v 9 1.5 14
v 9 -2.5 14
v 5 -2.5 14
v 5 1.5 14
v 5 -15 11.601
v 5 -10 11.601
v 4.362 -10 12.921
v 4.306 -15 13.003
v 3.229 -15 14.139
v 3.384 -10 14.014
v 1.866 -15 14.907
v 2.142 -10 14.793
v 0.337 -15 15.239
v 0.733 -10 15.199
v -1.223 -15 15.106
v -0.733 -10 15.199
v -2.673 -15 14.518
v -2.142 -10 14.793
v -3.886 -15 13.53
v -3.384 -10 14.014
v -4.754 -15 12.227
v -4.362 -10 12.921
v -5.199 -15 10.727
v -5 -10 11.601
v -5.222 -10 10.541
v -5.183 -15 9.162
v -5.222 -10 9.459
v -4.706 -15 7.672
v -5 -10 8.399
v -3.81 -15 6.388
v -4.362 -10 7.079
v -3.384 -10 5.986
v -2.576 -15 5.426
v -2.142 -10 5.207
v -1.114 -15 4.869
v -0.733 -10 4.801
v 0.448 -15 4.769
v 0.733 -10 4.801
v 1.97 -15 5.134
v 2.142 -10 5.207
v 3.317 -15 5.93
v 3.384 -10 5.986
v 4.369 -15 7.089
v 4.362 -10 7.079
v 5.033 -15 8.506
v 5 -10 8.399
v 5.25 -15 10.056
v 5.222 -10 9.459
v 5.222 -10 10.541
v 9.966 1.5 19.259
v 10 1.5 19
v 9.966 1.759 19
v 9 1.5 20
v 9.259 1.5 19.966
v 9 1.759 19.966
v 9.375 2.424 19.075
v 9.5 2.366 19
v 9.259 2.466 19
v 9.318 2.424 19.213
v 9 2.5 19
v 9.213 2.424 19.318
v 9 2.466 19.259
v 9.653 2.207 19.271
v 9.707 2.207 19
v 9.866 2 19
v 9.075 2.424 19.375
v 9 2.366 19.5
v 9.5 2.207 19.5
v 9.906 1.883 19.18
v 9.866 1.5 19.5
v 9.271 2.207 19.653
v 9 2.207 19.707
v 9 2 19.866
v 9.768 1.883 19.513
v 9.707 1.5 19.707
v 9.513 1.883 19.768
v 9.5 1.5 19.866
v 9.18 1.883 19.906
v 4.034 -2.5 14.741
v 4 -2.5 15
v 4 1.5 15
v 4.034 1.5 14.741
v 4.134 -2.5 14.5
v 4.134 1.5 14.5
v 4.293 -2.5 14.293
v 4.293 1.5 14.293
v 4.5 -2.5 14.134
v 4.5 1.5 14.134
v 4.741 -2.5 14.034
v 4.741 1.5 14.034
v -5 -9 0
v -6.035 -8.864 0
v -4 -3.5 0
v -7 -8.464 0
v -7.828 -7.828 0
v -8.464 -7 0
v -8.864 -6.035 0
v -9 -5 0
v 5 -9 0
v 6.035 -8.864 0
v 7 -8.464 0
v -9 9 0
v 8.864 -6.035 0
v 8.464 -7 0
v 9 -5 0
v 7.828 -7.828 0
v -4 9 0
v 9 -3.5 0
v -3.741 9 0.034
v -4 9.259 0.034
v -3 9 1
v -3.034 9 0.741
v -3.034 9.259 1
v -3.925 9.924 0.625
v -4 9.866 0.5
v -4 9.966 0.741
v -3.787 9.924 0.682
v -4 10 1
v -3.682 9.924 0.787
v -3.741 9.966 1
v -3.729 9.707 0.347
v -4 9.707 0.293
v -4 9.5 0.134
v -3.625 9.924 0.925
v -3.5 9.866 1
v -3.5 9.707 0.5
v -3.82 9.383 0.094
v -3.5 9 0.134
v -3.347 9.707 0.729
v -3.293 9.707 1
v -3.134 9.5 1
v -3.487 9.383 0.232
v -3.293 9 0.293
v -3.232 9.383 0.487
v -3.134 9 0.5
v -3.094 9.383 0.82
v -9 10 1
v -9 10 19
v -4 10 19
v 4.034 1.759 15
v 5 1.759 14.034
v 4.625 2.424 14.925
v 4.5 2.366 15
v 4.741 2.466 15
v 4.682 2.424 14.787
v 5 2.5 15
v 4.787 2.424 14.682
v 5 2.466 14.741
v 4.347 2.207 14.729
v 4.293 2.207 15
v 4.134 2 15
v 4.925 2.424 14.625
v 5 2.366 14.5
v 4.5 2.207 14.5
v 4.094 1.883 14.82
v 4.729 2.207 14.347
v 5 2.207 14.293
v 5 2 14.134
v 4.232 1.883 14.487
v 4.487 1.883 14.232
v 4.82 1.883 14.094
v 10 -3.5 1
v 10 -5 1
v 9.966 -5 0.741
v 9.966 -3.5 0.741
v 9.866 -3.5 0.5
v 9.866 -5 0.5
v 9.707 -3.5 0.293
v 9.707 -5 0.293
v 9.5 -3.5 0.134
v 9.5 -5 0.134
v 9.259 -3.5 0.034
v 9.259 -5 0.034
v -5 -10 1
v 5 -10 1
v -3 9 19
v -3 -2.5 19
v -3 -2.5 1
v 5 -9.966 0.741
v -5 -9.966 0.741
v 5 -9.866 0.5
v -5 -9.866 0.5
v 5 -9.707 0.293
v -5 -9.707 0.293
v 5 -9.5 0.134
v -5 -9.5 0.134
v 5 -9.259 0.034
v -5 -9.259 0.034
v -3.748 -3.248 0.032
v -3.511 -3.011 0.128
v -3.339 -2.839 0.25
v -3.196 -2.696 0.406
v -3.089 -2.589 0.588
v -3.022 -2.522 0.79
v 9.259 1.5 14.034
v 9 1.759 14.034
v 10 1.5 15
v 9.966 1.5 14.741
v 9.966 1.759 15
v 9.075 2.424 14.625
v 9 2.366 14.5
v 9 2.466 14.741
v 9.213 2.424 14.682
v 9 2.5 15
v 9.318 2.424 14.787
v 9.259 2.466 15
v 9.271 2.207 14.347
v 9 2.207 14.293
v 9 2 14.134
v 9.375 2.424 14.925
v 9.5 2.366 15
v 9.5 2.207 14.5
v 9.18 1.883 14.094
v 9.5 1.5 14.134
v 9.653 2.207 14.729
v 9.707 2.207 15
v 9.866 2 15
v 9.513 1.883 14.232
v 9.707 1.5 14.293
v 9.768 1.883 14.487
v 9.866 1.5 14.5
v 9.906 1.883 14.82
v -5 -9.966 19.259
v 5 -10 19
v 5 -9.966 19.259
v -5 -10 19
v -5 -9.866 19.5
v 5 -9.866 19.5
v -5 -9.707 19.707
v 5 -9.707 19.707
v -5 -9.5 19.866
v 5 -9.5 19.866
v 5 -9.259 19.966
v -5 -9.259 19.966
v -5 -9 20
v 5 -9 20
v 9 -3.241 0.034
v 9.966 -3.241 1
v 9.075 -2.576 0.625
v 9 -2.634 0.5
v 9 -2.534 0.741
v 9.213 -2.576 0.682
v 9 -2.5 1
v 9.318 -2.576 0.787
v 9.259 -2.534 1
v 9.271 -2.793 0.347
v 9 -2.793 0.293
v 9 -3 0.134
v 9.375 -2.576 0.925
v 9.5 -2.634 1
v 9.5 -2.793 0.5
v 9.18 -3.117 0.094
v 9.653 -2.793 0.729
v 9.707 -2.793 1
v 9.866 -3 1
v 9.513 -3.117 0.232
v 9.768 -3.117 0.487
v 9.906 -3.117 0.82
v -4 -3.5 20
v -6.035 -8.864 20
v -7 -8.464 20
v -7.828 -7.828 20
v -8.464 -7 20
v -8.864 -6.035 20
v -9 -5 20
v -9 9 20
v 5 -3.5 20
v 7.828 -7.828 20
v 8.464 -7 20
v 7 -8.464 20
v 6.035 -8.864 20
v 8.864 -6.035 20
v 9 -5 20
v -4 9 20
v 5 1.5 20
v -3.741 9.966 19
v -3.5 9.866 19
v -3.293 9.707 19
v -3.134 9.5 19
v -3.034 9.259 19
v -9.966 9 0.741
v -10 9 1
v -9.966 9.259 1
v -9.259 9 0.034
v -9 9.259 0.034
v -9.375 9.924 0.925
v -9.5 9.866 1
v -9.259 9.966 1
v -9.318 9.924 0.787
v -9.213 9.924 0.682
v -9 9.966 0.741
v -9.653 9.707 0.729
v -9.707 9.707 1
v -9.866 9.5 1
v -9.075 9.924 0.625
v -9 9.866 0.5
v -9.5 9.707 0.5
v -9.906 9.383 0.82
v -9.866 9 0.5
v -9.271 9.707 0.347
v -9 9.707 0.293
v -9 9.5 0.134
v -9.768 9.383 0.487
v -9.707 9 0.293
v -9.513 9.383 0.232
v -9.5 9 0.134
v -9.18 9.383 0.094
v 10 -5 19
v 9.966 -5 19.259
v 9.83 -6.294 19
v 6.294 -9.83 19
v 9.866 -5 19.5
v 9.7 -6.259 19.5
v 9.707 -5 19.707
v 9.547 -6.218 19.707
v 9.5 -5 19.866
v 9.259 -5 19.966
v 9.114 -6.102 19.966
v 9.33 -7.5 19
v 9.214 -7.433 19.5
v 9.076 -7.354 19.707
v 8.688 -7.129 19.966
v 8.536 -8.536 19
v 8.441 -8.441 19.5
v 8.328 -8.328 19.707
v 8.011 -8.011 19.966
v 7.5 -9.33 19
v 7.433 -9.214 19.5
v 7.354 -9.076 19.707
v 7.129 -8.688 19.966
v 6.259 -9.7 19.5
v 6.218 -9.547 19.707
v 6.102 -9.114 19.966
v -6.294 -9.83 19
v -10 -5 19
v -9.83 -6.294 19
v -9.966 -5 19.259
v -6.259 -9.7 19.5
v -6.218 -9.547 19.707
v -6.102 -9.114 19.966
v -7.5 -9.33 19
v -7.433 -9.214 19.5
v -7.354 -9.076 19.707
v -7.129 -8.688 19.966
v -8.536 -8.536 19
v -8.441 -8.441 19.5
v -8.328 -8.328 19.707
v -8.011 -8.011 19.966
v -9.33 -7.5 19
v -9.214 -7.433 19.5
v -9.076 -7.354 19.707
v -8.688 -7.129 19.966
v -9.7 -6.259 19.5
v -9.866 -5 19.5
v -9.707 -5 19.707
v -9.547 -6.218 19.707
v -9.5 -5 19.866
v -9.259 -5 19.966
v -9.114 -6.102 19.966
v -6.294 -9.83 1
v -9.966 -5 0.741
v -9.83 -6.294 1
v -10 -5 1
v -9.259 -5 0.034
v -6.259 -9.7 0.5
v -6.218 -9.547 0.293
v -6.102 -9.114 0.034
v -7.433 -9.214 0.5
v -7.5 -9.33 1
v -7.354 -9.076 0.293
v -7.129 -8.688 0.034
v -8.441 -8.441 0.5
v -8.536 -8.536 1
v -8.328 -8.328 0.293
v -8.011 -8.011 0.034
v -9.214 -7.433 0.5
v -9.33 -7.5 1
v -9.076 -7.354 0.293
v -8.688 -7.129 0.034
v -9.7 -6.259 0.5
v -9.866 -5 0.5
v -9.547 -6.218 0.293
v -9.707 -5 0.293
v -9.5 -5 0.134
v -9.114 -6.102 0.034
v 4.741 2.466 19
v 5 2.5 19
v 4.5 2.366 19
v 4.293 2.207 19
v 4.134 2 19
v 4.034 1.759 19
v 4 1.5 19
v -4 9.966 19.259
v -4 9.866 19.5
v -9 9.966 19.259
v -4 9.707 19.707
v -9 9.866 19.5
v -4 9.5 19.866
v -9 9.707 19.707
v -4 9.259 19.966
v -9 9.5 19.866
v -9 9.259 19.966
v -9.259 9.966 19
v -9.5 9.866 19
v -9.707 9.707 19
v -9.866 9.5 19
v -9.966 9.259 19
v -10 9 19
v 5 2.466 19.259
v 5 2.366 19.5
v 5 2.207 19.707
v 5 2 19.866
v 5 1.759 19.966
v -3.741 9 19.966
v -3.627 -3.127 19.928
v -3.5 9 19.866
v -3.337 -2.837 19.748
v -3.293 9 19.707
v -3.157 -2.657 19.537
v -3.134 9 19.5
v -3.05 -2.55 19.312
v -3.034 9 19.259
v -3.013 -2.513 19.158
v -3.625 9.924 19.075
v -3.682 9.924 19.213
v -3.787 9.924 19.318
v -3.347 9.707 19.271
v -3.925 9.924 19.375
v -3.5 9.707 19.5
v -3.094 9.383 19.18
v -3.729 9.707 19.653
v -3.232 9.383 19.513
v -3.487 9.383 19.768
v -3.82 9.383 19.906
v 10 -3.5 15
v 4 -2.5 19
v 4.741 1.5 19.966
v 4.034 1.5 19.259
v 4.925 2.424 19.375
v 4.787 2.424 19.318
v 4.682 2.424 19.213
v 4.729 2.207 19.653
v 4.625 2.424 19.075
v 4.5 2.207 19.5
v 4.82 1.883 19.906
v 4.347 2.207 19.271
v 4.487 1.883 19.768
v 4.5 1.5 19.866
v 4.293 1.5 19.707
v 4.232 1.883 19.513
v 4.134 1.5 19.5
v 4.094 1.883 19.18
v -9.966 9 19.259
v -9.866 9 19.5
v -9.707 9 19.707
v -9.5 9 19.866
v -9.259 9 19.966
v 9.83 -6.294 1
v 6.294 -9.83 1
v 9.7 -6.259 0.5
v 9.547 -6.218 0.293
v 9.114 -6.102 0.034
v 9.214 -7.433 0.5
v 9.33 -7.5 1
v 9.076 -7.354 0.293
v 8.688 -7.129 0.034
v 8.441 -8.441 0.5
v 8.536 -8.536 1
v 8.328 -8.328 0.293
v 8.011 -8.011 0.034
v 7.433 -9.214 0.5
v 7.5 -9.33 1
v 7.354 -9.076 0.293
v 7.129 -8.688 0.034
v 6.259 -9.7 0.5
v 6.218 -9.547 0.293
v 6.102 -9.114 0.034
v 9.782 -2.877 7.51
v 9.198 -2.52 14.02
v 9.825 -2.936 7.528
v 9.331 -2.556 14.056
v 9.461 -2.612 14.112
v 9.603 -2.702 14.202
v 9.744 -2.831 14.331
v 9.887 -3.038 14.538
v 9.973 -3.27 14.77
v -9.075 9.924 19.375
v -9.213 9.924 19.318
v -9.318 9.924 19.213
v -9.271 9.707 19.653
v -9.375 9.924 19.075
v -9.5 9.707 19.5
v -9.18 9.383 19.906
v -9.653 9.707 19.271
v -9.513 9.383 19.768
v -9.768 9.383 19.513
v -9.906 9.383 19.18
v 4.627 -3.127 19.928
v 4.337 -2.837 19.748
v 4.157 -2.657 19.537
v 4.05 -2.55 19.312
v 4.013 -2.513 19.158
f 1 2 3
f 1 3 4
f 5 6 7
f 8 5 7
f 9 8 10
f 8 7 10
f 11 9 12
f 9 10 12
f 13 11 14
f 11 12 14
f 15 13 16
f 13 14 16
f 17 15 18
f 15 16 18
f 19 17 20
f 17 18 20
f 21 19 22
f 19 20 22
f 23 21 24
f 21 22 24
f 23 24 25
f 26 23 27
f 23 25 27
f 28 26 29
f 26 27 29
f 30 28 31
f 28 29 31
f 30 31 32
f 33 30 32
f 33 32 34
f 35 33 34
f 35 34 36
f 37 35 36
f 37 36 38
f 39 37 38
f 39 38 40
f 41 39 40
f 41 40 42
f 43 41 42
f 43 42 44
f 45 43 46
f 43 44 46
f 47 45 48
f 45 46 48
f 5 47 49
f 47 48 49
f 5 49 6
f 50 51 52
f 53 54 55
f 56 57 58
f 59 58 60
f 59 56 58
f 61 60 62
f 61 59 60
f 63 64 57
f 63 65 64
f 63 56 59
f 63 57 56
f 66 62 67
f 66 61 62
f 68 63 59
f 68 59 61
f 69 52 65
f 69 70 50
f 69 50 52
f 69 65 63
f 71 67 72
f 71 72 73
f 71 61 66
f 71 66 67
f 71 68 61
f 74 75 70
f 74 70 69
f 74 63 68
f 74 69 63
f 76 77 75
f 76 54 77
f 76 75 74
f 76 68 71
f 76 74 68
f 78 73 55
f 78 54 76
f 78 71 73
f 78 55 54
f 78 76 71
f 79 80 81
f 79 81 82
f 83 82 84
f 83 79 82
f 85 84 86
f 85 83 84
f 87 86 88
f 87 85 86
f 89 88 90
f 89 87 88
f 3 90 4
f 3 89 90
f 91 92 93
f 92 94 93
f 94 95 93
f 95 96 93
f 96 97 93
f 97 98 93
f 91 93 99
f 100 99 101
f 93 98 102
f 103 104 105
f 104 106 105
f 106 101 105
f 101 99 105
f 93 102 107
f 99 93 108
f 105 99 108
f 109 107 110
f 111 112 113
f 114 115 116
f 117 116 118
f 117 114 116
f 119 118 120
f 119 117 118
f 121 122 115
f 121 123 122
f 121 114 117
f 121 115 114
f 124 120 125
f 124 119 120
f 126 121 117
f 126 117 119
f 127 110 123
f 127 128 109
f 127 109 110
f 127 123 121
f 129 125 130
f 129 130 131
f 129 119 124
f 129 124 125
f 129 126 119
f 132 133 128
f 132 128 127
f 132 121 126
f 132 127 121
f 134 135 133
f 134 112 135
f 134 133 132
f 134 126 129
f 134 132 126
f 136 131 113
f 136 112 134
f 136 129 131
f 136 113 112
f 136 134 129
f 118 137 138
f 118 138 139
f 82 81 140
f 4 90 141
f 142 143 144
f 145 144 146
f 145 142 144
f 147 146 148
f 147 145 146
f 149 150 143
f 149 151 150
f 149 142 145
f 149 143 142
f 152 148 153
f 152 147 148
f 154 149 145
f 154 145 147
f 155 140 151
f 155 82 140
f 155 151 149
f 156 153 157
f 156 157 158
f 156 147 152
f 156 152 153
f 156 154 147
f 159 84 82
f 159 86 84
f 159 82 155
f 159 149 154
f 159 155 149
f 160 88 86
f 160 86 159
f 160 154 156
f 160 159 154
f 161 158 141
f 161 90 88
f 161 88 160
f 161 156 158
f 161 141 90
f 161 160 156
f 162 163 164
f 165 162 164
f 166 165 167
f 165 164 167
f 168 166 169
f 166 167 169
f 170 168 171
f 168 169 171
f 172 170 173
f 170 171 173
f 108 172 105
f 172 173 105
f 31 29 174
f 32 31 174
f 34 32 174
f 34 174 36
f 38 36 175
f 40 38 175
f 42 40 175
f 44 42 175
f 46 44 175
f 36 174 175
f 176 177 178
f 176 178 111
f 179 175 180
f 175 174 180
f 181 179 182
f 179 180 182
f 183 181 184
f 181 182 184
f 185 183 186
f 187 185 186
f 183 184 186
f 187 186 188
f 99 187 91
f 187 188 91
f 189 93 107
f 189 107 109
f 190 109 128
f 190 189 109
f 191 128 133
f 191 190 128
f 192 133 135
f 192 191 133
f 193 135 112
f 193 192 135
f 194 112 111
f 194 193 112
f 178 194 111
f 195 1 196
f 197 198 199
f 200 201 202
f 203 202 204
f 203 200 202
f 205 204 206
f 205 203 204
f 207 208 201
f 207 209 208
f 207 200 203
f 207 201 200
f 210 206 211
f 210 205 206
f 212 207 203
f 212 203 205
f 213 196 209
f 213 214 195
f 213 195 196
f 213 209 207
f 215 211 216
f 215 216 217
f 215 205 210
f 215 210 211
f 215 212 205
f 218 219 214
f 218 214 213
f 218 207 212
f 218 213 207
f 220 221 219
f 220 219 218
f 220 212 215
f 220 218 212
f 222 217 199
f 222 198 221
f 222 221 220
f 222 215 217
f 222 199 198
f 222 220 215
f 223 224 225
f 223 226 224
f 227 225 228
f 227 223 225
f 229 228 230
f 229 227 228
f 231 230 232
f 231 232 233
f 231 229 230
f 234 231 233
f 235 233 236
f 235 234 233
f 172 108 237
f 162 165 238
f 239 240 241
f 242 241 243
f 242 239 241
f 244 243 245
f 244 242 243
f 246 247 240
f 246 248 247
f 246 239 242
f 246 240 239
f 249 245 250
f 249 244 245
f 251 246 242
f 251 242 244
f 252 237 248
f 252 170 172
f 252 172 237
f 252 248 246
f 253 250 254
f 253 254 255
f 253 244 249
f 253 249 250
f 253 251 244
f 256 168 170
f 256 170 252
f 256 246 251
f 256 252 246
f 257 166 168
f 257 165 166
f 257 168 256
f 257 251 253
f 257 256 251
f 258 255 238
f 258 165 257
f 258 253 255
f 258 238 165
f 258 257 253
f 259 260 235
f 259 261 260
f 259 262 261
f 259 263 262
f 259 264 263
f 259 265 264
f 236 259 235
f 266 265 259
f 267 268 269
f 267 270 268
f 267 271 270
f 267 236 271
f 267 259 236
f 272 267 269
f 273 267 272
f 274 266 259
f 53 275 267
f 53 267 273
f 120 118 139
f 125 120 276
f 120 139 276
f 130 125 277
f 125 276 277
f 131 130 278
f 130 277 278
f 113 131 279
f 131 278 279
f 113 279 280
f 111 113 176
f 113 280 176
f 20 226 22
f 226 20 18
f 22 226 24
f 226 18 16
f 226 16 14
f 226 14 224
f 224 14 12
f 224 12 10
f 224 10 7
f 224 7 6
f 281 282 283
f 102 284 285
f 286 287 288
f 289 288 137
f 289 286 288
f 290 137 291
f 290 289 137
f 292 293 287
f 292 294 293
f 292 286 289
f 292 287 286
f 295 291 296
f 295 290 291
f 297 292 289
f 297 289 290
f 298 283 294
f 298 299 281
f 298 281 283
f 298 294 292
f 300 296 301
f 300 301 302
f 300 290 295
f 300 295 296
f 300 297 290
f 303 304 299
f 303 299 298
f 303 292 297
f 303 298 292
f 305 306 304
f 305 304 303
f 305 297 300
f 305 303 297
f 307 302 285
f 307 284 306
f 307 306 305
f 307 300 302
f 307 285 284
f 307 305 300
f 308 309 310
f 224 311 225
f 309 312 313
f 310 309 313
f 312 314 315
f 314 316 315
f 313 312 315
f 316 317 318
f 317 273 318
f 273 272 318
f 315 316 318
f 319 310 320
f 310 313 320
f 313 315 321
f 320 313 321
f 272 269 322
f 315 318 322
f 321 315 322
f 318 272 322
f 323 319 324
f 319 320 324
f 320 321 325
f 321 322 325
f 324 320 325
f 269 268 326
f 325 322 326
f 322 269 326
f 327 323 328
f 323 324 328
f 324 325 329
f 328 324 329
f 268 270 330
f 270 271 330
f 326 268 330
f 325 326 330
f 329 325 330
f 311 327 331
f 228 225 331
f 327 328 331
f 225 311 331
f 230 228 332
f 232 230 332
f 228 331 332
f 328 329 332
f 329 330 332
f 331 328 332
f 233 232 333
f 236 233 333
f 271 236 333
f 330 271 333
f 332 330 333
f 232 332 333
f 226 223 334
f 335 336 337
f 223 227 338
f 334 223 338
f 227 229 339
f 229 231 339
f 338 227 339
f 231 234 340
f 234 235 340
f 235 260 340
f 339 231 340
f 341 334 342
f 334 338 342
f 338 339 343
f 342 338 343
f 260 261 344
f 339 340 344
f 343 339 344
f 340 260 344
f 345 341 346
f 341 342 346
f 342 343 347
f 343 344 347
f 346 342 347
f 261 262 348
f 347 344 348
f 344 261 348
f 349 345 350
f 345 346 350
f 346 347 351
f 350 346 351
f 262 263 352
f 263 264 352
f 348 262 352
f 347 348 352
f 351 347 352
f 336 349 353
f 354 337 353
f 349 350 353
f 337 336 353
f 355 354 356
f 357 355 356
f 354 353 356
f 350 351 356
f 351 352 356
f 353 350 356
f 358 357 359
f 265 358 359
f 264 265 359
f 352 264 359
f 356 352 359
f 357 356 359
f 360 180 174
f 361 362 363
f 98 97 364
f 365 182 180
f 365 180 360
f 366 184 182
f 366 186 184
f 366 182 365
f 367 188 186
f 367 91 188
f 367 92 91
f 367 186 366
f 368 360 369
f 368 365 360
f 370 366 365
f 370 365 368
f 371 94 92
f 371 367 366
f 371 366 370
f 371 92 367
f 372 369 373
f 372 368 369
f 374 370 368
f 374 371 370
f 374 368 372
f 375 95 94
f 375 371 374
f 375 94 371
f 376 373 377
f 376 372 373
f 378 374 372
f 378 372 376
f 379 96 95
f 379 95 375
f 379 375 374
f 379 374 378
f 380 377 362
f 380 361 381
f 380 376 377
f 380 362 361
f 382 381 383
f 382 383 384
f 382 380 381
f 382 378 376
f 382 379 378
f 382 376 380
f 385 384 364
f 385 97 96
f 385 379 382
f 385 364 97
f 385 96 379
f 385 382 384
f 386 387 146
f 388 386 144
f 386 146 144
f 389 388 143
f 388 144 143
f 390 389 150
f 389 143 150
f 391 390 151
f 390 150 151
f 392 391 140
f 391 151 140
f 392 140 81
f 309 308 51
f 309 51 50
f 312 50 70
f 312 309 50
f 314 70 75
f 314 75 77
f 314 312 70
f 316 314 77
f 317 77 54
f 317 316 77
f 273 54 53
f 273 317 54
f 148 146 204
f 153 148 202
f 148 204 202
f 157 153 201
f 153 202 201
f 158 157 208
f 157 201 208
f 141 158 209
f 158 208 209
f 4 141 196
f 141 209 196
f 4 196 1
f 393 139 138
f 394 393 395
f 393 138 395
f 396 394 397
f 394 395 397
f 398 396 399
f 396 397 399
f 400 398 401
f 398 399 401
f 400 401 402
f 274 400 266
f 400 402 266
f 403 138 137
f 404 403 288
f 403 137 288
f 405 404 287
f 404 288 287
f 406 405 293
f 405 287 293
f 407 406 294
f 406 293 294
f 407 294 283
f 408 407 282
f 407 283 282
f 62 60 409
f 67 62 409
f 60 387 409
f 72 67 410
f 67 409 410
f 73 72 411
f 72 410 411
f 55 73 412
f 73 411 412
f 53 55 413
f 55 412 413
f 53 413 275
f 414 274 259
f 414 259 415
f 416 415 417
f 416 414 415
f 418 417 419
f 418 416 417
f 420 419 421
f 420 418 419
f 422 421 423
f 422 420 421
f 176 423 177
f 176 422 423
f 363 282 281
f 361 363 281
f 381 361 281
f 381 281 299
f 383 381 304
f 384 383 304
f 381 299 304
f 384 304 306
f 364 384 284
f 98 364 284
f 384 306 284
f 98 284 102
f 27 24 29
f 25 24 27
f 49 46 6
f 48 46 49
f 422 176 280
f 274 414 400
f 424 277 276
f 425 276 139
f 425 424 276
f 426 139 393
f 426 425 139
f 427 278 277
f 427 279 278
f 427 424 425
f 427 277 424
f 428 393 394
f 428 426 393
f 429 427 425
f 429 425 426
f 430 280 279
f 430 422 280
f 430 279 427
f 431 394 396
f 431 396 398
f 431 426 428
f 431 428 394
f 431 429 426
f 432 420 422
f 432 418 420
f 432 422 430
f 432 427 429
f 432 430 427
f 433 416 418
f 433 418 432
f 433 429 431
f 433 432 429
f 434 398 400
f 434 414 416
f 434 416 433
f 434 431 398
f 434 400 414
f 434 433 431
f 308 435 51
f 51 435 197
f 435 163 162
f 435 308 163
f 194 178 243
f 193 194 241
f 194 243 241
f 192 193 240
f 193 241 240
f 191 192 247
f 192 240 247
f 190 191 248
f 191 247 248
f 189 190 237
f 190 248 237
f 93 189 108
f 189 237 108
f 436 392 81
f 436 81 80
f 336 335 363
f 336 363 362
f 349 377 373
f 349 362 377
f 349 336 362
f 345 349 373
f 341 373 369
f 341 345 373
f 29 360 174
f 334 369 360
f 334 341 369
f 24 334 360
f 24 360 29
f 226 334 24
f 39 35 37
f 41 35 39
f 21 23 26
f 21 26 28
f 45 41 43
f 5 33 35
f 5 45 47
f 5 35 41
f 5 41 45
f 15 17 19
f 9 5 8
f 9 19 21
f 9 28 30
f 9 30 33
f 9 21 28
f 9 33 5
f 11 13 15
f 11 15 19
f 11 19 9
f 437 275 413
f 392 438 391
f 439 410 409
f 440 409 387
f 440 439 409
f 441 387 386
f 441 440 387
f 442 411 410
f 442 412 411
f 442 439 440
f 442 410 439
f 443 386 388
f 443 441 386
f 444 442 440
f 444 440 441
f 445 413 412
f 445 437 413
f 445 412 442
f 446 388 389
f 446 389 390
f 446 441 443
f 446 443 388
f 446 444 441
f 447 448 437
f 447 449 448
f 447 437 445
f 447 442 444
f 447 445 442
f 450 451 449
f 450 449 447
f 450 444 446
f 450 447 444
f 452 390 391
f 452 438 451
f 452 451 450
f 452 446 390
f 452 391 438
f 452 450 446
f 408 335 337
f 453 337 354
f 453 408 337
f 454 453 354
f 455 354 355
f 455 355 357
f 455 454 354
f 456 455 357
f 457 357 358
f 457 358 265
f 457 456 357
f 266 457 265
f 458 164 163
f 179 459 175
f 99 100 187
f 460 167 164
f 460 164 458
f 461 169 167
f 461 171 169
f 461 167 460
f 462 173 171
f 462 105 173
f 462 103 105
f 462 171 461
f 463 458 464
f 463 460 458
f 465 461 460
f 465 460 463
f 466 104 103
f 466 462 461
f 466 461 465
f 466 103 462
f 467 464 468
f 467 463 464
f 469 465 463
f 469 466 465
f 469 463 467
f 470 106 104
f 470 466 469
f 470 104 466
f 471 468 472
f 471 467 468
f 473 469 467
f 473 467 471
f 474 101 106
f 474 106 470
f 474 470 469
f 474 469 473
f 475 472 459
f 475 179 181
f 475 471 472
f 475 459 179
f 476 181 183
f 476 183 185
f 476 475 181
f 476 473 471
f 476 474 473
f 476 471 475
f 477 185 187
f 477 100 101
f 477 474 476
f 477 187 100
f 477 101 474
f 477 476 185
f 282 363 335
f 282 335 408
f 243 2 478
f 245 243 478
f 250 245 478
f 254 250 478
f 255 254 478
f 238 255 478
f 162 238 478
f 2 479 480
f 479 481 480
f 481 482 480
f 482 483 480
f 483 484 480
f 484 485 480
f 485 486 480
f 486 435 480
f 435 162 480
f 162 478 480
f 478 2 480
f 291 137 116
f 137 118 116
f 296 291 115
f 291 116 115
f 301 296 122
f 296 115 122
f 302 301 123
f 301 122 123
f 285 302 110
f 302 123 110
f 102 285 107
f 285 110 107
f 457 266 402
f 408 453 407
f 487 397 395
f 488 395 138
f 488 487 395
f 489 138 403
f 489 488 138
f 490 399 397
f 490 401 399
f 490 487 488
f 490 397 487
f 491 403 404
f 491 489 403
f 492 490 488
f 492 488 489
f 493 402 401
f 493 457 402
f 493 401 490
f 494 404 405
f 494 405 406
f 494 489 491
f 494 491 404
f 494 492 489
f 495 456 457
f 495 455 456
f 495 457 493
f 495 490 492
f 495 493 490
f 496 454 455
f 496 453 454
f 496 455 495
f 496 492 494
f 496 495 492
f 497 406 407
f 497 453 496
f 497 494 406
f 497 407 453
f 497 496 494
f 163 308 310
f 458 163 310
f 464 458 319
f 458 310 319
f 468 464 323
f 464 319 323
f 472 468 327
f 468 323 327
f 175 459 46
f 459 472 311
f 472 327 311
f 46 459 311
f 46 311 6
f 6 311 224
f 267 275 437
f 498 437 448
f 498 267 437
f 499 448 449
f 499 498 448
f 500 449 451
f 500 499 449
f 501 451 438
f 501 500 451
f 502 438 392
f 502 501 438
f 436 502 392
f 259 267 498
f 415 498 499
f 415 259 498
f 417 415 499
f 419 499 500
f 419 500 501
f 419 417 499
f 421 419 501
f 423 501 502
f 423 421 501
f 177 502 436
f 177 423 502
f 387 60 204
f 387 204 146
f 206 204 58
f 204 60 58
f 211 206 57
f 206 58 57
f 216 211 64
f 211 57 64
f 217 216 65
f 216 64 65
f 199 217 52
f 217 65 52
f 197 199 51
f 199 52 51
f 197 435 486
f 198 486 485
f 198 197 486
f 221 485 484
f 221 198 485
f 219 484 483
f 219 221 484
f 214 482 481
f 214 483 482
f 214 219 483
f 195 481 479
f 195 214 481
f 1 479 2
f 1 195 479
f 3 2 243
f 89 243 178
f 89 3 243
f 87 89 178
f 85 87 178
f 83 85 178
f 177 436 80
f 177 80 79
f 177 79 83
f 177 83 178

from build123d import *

# Parameters (mm, degrees)
SKETCH1_W           = 20
SKETCH1_H           = 20
BOSS_EXTRUDE1_DEPTH = 20
CUT_EXTRUDE1_DEPTH  = 25
SKETCH3_W           = 14
SKETCH3_H           = 5
CUT_EXTRUDE2_DEPTH  = 13
FILLET1_R           = 5
FILLET2_R           = 1
FILLET3_R           = 1
SKETCH4_R           = 5.25
BOSS_EXTRUDE2_DEPTH = 5


with BuildPart() as part:
    # Sketch1 → Boss-Extrude1 (new body)
    with BuildSketch(Plane.XY):
        Rectangle(SKETCH1_W, SKETCH1_H)
    extrude(amount=BOSS_EXTRUDE1_DEPTH)

    # Sketch2 → Cut-Extrude1 (cut)
    with BuildSketch(Plane.XY.offset(20)):
        Polygon((4, 2.5), (4, -2.5), (-3, -2.5), (-3, 10), (10, 10), (10, 2.5), align=None)
    extrude(amount=-CUT_EXTRUDE1_DEPTH, mode=Mode.SUBTRACT)

    # Sketch3 → Cut-Extrude2 (cut)
    with BuildSketch(Plane(origin=(10, 0, 0), x_dir=(0, 0, -1), z_dir=(1, 0, 0))):
        with Locations((-7, 0)):
            Rectangle(SKETCH3_W, SKETCH3_H)
    extrude(amount=-CUT_EXTRUDE2_DEPTH, mode=Mode.SUBTRACT)

    # Fillet1
    fillet1_edges = [part.edges().sort_by_distance(p)[0] for p in [
        (10, -10, 10),
        (-10, -10, 10),
    ]]
    fillet(fillet1_edges, radius=FILLET1_R)

    # Fillet2
    fillet2_edges = [part.edges().sort_by_distance(p)[0] for p in [
        (-10, 2.5, 20),
        (-3, 3.75, 0),
        (-3, 3.75, 20),
        (4, 0, 20),
        (4, 0, 14),
        (10, 0, 14),
        (-10, 2.5, 0),
        (10, -1.25, 20),
        (10, -3.75, 0),
        (0, -10, 0),
        (-8.535533906, -8.535533906, 0),
        (8.535533906, -8.535533906, 0),
        (0, -10, 20),
        (-8.535533906, -8.535533906, 20),
        (8.535533906, -8.535533906, 20),
    ]]
    fillet(fillet2_edges, radius=FILLET2_R)

    # Fillet3
    fillet3_edges = [part.edges().sort_by_distance(p)[0] for p in [
        (2.5, -2.5, 0),
        (9.707106781, -2.5, 0.292893219),
        (10, -2.5, 8),
        (9.707106781, 2.5, 19.707106781),
        (10, 2.5, 17),
        (9.707106781, 2.5, 14.292893219),
        (7, 2.5, 14),
        (4.292893219, 2.5, 14.292893219),
        (4, 2.5, 17),
        (4.292893219, 2.5, 19.707106781),
        (7, 2.5, 20),
        (0.5, -2.5, 20),
        (-3.292893219, 10, 0.292893219),
        (-9.707106781, 10, 0.292893219),
        (-6.5, 10, 0),
        (-3, 10, 10),
        (-3.292893219, 10, 19.707106781),
        (-9.707106781, 10, 19.707106781),
        (-6.5, 10, 20),
        (-10, 10, 10),
    ]]
    fillet(fillet3_edges, radius=FILLET3_R)

    # Sketch4 → Boss-Extrude2 (add)
    with BuildSketch(Plane.XZ.offset(10)):
        with Locations(Location((0, 10, 0), (0, 0, 17.752790162))):
            Circle(SKETCH4_R)
    extrude(amount=BOSS_EXTRUDE2_DEPTH)


solid = part.part
